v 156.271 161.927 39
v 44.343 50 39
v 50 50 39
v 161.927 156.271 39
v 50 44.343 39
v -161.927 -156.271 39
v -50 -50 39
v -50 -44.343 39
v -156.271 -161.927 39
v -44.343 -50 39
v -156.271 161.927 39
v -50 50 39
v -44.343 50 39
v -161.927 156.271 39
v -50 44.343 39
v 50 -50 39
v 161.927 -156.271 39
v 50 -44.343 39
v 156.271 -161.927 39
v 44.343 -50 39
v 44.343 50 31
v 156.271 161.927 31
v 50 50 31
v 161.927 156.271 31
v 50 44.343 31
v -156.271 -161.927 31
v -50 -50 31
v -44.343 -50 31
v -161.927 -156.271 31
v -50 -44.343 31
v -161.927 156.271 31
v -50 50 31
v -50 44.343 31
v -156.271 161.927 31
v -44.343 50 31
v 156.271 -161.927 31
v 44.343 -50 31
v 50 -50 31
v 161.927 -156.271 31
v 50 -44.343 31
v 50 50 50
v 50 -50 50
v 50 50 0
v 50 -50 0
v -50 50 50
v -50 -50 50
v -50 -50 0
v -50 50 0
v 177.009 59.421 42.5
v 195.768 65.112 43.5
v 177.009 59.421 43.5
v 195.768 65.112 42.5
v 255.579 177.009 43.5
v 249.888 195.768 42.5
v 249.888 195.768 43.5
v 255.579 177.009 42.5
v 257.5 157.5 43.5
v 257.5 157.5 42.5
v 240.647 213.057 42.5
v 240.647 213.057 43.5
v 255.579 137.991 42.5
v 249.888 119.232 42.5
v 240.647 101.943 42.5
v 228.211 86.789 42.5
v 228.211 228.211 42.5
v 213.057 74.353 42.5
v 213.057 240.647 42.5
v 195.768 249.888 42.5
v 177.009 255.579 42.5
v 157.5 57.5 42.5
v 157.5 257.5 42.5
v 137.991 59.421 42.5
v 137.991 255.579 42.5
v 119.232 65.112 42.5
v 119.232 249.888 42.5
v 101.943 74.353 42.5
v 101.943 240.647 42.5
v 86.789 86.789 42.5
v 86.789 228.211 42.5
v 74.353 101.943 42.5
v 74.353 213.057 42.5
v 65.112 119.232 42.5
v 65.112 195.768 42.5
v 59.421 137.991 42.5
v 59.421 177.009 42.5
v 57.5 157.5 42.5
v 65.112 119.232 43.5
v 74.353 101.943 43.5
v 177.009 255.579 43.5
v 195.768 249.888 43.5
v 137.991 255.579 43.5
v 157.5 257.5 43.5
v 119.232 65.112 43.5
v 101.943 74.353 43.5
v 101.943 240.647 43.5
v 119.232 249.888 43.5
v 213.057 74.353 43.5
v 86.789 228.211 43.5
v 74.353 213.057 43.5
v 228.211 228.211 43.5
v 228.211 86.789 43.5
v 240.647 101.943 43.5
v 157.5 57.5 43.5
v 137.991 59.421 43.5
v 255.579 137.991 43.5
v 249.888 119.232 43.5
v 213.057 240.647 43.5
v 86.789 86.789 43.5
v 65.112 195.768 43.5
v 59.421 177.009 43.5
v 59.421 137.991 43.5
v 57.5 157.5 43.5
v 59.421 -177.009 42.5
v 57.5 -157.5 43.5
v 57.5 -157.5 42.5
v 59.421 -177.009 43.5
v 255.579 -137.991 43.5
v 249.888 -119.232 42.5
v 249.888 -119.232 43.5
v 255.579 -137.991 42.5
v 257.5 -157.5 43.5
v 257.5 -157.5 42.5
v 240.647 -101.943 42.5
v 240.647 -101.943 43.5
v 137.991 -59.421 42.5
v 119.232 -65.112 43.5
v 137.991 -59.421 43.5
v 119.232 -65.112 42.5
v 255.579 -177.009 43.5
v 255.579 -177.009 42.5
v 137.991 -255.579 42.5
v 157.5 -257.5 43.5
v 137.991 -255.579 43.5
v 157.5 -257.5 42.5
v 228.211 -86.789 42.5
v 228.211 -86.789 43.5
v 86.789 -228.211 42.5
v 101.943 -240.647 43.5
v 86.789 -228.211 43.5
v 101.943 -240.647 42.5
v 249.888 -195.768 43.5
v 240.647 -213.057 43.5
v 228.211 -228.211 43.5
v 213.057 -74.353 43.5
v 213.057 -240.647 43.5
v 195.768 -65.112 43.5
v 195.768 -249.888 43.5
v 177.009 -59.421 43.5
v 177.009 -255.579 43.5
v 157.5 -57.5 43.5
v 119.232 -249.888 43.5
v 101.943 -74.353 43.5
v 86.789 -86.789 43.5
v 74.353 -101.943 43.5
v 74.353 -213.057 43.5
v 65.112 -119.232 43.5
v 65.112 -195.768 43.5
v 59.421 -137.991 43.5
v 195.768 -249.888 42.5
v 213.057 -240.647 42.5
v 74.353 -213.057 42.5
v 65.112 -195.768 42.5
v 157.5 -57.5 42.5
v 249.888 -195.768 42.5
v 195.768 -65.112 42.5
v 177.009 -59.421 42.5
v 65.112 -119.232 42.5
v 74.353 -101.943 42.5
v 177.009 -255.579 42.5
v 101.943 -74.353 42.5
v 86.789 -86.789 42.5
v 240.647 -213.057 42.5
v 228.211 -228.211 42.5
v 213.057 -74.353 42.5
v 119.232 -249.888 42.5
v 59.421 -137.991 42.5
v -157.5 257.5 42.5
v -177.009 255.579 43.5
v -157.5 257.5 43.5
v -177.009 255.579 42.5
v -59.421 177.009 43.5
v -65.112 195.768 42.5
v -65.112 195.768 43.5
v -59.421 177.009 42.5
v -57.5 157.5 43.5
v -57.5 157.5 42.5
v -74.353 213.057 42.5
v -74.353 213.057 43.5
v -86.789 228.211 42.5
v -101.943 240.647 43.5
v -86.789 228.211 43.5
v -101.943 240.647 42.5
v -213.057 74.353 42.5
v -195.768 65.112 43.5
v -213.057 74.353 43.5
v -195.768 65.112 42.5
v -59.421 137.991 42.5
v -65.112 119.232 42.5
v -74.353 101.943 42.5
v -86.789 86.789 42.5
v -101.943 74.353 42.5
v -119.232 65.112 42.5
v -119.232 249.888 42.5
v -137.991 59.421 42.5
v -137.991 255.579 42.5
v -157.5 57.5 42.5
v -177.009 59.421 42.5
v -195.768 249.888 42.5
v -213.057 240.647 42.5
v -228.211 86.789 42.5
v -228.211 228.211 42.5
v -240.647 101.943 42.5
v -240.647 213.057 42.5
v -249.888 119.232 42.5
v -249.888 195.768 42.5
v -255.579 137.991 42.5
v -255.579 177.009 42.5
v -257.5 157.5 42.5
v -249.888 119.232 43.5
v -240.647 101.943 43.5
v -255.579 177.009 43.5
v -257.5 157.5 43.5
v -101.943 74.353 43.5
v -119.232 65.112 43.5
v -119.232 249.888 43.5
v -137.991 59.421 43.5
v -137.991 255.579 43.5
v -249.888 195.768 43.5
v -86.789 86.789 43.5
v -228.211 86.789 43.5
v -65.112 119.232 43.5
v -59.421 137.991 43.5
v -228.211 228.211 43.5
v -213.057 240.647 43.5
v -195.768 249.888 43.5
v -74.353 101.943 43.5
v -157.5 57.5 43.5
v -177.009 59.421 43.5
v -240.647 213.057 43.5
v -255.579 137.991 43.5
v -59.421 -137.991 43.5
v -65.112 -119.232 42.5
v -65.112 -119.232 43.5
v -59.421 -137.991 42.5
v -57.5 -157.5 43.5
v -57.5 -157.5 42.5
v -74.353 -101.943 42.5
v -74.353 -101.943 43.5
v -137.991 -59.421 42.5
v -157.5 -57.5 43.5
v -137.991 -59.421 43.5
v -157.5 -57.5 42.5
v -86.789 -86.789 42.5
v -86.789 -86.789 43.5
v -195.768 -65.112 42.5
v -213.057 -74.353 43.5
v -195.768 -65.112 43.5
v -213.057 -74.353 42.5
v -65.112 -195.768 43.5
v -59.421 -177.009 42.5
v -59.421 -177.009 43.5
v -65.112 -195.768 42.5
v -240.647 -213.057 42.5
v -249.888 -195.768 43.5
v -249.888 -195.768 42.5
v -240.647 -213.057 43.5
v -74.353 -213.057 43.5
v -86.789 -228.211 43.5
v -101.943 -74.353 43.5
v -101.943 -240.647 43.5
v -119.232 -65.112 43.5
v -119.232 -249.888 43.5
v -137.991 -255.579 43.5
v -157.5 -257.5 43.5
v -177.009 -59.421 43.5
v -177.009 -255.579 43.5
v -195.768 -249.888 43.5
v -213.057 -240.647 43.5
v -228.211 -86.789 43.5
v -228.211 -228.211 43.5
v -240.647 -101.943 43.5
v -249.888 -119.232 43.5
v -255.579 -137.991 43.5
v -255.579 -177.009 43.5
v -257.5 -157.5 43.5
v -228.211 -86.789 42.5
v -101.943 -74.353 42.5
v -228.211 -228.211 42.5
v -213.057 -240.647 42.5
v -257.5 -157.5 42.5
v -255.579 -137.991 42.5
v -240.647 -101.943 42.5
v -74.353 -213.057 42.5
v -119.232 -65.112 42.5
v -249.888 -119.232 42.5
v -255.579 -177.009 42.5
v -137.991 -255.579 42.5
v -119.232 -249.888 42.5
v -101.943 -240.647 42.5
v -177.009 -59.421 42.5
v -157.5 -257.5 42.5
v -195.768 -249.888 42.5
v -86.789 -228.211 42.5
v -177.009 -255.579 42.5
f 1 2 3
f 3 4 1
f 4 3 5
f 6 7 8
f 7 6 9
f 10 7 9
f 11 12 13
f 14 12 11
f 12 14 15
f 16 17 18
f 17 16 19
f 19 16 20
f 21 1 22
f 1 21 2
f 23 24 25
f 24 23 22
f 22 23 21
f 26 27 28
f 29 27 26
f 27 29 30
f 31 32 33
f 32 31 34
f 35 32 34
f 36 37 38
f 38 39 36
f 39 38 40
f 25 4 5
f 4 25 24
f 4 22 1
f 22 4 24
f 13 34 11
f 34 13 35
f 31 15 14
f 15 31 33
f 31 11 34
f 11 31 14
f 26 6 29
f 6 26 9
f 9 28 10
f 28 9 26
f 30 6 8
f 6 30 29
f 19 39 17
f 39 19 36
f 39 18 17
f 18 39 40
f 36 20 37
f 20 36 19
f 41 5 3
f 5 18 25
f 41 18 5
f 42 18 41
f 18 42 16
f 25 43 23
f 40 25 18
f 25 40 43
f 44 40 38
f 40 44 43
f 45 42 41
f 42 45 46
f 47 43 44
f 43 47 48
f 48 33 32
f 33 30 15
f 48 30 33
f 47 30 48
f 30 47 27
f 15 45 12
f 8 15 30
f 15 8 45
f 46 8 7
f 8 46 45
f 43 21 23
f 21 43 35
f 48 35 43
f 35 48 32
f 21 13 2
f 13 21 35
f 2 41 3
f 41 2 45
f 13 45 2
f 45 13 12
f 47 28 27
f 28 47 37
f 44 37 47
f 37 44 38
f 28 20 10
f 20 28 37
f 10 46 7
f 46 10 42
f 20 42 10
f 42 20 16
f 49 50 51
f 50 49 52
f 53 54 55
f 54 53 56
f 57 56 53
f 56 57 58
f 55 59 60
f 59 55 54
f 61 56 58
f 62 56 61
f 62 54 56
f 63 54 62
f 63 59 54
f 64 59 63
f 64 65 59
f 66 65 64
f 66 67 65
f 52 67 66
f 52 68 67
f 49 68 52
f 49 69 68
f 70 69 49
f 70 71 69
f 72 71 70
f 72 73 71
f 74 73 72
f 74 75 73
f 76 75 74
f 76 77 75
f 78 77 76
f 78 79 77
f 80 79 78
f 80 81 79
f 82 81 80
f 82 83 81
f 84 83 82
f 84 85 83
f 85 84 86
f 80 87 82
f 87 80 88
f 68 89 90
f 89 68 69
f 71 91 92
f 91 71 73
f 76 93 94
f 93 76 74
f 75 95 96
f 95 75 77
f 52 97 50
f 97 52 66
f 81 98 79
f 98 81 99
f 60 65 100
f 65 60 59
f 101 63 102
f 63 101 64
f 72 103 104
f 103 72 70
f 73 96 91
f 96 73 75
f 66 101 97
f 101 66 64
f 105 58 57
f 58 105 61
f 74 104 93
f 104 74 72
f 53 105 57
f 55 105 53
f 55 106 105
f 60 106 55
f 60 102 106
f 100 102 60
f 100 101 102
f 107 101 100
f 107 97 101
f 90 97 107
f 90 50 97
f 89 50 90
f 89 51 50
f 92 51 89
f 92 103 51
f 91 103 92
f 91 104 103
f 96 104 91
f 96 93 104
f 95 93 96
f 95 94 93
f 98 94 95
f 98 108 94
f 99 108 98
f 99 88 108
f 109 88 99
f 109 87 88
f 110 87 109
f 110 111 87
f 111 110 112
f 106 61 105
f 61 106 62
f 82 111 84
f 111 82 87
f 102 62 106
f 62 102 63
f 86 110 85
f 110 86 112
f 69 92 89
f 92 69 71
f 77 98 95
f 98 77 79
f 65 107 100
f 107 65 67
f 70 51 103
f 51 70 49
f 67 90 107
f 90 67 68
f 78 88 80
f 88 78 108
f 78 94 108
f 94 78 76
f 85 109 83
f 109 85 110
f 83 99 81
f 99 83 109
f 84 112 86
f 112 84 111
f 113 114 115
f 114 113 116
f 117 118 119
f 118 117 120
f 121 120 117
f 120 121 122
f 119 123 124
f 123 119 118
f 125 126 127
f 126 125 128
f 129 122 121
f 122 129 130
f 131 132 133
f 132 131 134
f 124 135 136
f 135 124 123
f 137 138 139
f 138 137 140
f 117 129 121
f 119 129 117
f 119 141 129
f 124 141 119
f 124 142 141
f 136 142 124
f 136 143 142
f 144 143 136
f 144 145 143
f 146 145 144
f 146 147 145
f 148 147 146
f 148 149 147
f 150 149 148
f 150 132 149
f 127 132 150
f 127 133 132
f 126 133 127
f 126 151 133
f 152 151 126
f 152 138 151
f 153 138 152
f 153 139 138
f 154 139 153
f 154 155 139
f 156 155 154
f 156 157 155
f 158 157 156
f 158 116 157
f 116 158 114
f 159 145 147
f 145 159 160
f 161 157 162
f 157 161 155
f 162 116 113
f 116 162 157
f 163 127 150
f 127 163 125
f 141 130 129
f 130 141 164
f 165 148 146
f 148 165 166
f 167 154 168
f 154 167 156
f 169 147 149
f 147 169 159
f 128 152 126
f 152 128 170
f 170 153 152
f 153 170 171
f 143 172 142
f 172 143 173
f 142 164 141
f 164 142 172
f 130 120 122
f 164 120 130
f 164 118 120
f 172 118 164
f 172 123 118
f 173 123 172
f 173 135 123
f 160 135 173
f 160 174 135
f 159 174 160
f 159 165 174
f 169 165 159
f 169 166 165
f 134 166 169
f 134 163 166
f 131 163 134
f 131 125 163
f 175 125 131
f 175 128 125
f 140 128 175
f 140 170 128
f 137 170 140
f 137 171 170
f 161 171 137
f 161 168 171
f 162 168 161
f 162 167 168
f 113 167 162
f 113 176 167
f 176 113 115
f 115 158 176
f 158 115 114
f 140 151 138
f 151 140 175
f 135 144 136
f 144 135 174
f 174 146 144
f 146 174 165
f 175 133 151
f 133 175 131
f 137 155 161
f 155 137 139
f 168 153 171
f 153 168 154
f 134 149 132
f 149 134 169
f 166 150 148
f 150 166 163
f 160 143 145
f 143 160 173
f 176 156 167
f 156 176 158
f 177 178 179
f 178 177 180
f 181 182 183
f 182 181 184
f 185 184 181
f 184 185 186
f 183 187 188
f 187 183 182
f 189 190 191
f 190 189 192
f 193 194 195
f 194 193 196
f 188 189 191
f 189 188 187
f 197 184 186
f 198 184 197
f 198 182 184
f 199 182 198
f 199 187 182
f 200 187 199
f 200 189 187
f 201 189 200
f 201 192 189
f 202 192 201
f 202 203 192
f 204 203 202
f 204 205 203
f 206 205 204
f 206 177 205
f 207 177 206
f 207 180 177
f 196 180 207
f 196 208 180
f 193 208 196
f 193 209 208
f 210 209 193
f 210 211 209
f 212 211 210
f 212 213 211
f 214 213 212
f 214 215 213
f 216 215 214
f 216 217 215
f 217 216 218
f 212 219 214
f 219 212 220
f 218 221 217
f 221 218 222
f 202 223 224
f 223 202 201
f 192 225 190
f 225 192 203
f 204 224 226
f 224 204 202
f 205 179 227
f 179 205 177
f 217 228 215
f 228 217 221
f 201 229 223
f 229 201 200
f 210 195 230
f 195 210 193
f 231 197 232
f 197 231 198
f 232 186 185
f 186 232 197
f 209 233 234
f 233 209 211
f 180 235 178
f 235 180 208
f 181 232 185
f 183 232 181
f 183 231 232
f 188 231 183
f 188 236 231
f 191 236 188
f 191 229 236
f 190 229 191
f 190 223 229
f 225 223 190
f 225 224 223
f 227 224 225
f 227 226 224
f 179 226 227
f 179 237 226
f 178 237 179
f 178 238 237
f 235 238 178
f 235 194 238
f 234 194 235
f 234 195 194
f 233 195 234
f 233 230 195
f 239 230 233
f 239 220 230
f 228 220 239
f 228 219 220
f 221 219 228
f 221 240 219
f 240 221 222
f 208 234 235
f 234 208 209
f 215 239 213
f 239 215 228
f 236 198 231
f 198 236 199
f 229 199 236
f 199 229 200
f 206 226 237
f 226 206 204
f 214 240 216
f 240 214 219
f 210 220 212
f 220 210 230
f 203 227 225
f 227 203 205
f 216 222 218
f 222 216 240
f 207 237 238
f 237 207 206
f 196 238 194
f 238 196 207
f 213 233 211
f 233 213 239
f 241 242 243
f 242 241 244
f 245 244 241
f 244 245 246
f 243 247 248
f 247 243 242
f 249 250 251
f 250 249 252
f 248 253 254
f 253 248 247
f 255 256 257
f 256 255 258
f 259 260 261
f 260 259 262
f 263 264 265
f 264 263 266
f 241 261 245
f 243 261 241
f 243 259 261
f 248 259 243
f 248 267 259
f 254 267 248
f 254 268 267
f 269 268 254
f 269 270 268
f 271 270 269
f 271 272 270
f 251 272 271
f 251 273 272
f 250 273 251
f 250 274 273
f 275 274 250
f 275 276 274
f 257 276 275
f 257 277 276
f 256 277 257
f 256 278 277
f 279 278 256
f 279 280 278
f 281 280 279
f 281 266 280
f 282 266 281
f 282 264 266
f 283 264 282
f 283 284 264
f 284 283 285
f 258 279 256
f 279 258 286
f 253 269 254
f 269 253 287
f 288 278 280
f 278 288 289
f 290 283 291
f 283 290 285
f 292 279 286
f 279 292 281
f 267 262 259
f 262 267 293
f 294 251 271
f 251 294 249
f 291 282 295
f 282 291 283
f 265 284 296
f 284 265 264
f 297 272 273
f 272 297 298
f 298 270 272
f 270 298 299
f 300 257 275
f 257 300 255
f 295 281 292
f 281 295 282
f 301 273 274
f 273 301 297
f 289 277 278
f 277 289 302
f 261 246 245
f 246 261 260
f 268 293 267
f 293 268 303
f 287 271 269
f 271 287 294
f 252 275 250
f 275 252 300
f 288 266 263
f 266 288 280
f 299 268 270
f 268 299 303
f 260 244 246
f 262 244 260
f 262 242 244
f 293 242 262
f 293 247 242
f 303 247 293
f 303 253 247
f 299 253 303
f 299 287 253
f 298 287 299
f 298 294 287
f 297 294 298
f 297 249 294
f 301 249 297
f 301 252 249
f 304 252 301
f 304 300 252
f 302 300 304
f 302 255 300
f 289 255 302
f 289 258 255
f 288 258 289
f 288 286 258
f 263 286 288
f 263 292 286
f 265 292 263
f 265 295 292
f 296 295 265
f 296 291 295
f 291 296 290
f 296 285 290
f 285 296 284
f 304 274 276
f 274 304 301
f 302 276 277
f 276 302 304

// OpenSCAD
$fn=32;

mav_width = 100.0;
mav_height = 50.0;
mav_arm_thickness = 8.0;
mav_arm_length= 450.0 / 2.0;
mav_arm_height= 10;
mav_prop_length = 100;

mav_body_color = [0.2, 0.2, 0.2];
mav_front_propeller_color = [0, 0, 1];
mav_back_propeller_color = [1, 0, 0];
// mav_front_propeller_color = [0.5, 0.5, 0.5];
// mav_back_propeller_color = [0.5, 0.5, 0.5];

// MAV
translate([0.0, 0.0, mav_height / 2]) {
  // MAV Body
  color(mav_body_color)
    cube([mav_width, mav_width, mav_height], center=true);

  // MAV Arms
  for (i = [0:3]) {
    color(mav_body_color)
      rotate([0, 0, 45 + i * 90])
        translate([mav_arm_length / 2, 0, mav_arm_height])
          cube([mav_arm_length, mav_arm_thickness, mav_arm_thickness], center=true);
  }

  // MAV Propeller
  pos = mav_arm_length * 0.7;
  h = mav_arm_height + mav_arm_thickness;

  color(mav_front_propeller_color)
    translate([pos, pos, h]) cylinder(r=mav_prop_length, center=true);
  color(mav_front_propeller_color)
    translate([pos, -pos, h]) cylinder(r=mav_prop_length, center=true);

  color(mav_back_propeller_color)
    translate([-pos, pos, h]) cylinder(r=mav_prop_length, center=true);
  color(mav_back_propeller_color)
    translate([-pos, -pos, h]) cylinder(r=mav_prop_length, center=true);
}
